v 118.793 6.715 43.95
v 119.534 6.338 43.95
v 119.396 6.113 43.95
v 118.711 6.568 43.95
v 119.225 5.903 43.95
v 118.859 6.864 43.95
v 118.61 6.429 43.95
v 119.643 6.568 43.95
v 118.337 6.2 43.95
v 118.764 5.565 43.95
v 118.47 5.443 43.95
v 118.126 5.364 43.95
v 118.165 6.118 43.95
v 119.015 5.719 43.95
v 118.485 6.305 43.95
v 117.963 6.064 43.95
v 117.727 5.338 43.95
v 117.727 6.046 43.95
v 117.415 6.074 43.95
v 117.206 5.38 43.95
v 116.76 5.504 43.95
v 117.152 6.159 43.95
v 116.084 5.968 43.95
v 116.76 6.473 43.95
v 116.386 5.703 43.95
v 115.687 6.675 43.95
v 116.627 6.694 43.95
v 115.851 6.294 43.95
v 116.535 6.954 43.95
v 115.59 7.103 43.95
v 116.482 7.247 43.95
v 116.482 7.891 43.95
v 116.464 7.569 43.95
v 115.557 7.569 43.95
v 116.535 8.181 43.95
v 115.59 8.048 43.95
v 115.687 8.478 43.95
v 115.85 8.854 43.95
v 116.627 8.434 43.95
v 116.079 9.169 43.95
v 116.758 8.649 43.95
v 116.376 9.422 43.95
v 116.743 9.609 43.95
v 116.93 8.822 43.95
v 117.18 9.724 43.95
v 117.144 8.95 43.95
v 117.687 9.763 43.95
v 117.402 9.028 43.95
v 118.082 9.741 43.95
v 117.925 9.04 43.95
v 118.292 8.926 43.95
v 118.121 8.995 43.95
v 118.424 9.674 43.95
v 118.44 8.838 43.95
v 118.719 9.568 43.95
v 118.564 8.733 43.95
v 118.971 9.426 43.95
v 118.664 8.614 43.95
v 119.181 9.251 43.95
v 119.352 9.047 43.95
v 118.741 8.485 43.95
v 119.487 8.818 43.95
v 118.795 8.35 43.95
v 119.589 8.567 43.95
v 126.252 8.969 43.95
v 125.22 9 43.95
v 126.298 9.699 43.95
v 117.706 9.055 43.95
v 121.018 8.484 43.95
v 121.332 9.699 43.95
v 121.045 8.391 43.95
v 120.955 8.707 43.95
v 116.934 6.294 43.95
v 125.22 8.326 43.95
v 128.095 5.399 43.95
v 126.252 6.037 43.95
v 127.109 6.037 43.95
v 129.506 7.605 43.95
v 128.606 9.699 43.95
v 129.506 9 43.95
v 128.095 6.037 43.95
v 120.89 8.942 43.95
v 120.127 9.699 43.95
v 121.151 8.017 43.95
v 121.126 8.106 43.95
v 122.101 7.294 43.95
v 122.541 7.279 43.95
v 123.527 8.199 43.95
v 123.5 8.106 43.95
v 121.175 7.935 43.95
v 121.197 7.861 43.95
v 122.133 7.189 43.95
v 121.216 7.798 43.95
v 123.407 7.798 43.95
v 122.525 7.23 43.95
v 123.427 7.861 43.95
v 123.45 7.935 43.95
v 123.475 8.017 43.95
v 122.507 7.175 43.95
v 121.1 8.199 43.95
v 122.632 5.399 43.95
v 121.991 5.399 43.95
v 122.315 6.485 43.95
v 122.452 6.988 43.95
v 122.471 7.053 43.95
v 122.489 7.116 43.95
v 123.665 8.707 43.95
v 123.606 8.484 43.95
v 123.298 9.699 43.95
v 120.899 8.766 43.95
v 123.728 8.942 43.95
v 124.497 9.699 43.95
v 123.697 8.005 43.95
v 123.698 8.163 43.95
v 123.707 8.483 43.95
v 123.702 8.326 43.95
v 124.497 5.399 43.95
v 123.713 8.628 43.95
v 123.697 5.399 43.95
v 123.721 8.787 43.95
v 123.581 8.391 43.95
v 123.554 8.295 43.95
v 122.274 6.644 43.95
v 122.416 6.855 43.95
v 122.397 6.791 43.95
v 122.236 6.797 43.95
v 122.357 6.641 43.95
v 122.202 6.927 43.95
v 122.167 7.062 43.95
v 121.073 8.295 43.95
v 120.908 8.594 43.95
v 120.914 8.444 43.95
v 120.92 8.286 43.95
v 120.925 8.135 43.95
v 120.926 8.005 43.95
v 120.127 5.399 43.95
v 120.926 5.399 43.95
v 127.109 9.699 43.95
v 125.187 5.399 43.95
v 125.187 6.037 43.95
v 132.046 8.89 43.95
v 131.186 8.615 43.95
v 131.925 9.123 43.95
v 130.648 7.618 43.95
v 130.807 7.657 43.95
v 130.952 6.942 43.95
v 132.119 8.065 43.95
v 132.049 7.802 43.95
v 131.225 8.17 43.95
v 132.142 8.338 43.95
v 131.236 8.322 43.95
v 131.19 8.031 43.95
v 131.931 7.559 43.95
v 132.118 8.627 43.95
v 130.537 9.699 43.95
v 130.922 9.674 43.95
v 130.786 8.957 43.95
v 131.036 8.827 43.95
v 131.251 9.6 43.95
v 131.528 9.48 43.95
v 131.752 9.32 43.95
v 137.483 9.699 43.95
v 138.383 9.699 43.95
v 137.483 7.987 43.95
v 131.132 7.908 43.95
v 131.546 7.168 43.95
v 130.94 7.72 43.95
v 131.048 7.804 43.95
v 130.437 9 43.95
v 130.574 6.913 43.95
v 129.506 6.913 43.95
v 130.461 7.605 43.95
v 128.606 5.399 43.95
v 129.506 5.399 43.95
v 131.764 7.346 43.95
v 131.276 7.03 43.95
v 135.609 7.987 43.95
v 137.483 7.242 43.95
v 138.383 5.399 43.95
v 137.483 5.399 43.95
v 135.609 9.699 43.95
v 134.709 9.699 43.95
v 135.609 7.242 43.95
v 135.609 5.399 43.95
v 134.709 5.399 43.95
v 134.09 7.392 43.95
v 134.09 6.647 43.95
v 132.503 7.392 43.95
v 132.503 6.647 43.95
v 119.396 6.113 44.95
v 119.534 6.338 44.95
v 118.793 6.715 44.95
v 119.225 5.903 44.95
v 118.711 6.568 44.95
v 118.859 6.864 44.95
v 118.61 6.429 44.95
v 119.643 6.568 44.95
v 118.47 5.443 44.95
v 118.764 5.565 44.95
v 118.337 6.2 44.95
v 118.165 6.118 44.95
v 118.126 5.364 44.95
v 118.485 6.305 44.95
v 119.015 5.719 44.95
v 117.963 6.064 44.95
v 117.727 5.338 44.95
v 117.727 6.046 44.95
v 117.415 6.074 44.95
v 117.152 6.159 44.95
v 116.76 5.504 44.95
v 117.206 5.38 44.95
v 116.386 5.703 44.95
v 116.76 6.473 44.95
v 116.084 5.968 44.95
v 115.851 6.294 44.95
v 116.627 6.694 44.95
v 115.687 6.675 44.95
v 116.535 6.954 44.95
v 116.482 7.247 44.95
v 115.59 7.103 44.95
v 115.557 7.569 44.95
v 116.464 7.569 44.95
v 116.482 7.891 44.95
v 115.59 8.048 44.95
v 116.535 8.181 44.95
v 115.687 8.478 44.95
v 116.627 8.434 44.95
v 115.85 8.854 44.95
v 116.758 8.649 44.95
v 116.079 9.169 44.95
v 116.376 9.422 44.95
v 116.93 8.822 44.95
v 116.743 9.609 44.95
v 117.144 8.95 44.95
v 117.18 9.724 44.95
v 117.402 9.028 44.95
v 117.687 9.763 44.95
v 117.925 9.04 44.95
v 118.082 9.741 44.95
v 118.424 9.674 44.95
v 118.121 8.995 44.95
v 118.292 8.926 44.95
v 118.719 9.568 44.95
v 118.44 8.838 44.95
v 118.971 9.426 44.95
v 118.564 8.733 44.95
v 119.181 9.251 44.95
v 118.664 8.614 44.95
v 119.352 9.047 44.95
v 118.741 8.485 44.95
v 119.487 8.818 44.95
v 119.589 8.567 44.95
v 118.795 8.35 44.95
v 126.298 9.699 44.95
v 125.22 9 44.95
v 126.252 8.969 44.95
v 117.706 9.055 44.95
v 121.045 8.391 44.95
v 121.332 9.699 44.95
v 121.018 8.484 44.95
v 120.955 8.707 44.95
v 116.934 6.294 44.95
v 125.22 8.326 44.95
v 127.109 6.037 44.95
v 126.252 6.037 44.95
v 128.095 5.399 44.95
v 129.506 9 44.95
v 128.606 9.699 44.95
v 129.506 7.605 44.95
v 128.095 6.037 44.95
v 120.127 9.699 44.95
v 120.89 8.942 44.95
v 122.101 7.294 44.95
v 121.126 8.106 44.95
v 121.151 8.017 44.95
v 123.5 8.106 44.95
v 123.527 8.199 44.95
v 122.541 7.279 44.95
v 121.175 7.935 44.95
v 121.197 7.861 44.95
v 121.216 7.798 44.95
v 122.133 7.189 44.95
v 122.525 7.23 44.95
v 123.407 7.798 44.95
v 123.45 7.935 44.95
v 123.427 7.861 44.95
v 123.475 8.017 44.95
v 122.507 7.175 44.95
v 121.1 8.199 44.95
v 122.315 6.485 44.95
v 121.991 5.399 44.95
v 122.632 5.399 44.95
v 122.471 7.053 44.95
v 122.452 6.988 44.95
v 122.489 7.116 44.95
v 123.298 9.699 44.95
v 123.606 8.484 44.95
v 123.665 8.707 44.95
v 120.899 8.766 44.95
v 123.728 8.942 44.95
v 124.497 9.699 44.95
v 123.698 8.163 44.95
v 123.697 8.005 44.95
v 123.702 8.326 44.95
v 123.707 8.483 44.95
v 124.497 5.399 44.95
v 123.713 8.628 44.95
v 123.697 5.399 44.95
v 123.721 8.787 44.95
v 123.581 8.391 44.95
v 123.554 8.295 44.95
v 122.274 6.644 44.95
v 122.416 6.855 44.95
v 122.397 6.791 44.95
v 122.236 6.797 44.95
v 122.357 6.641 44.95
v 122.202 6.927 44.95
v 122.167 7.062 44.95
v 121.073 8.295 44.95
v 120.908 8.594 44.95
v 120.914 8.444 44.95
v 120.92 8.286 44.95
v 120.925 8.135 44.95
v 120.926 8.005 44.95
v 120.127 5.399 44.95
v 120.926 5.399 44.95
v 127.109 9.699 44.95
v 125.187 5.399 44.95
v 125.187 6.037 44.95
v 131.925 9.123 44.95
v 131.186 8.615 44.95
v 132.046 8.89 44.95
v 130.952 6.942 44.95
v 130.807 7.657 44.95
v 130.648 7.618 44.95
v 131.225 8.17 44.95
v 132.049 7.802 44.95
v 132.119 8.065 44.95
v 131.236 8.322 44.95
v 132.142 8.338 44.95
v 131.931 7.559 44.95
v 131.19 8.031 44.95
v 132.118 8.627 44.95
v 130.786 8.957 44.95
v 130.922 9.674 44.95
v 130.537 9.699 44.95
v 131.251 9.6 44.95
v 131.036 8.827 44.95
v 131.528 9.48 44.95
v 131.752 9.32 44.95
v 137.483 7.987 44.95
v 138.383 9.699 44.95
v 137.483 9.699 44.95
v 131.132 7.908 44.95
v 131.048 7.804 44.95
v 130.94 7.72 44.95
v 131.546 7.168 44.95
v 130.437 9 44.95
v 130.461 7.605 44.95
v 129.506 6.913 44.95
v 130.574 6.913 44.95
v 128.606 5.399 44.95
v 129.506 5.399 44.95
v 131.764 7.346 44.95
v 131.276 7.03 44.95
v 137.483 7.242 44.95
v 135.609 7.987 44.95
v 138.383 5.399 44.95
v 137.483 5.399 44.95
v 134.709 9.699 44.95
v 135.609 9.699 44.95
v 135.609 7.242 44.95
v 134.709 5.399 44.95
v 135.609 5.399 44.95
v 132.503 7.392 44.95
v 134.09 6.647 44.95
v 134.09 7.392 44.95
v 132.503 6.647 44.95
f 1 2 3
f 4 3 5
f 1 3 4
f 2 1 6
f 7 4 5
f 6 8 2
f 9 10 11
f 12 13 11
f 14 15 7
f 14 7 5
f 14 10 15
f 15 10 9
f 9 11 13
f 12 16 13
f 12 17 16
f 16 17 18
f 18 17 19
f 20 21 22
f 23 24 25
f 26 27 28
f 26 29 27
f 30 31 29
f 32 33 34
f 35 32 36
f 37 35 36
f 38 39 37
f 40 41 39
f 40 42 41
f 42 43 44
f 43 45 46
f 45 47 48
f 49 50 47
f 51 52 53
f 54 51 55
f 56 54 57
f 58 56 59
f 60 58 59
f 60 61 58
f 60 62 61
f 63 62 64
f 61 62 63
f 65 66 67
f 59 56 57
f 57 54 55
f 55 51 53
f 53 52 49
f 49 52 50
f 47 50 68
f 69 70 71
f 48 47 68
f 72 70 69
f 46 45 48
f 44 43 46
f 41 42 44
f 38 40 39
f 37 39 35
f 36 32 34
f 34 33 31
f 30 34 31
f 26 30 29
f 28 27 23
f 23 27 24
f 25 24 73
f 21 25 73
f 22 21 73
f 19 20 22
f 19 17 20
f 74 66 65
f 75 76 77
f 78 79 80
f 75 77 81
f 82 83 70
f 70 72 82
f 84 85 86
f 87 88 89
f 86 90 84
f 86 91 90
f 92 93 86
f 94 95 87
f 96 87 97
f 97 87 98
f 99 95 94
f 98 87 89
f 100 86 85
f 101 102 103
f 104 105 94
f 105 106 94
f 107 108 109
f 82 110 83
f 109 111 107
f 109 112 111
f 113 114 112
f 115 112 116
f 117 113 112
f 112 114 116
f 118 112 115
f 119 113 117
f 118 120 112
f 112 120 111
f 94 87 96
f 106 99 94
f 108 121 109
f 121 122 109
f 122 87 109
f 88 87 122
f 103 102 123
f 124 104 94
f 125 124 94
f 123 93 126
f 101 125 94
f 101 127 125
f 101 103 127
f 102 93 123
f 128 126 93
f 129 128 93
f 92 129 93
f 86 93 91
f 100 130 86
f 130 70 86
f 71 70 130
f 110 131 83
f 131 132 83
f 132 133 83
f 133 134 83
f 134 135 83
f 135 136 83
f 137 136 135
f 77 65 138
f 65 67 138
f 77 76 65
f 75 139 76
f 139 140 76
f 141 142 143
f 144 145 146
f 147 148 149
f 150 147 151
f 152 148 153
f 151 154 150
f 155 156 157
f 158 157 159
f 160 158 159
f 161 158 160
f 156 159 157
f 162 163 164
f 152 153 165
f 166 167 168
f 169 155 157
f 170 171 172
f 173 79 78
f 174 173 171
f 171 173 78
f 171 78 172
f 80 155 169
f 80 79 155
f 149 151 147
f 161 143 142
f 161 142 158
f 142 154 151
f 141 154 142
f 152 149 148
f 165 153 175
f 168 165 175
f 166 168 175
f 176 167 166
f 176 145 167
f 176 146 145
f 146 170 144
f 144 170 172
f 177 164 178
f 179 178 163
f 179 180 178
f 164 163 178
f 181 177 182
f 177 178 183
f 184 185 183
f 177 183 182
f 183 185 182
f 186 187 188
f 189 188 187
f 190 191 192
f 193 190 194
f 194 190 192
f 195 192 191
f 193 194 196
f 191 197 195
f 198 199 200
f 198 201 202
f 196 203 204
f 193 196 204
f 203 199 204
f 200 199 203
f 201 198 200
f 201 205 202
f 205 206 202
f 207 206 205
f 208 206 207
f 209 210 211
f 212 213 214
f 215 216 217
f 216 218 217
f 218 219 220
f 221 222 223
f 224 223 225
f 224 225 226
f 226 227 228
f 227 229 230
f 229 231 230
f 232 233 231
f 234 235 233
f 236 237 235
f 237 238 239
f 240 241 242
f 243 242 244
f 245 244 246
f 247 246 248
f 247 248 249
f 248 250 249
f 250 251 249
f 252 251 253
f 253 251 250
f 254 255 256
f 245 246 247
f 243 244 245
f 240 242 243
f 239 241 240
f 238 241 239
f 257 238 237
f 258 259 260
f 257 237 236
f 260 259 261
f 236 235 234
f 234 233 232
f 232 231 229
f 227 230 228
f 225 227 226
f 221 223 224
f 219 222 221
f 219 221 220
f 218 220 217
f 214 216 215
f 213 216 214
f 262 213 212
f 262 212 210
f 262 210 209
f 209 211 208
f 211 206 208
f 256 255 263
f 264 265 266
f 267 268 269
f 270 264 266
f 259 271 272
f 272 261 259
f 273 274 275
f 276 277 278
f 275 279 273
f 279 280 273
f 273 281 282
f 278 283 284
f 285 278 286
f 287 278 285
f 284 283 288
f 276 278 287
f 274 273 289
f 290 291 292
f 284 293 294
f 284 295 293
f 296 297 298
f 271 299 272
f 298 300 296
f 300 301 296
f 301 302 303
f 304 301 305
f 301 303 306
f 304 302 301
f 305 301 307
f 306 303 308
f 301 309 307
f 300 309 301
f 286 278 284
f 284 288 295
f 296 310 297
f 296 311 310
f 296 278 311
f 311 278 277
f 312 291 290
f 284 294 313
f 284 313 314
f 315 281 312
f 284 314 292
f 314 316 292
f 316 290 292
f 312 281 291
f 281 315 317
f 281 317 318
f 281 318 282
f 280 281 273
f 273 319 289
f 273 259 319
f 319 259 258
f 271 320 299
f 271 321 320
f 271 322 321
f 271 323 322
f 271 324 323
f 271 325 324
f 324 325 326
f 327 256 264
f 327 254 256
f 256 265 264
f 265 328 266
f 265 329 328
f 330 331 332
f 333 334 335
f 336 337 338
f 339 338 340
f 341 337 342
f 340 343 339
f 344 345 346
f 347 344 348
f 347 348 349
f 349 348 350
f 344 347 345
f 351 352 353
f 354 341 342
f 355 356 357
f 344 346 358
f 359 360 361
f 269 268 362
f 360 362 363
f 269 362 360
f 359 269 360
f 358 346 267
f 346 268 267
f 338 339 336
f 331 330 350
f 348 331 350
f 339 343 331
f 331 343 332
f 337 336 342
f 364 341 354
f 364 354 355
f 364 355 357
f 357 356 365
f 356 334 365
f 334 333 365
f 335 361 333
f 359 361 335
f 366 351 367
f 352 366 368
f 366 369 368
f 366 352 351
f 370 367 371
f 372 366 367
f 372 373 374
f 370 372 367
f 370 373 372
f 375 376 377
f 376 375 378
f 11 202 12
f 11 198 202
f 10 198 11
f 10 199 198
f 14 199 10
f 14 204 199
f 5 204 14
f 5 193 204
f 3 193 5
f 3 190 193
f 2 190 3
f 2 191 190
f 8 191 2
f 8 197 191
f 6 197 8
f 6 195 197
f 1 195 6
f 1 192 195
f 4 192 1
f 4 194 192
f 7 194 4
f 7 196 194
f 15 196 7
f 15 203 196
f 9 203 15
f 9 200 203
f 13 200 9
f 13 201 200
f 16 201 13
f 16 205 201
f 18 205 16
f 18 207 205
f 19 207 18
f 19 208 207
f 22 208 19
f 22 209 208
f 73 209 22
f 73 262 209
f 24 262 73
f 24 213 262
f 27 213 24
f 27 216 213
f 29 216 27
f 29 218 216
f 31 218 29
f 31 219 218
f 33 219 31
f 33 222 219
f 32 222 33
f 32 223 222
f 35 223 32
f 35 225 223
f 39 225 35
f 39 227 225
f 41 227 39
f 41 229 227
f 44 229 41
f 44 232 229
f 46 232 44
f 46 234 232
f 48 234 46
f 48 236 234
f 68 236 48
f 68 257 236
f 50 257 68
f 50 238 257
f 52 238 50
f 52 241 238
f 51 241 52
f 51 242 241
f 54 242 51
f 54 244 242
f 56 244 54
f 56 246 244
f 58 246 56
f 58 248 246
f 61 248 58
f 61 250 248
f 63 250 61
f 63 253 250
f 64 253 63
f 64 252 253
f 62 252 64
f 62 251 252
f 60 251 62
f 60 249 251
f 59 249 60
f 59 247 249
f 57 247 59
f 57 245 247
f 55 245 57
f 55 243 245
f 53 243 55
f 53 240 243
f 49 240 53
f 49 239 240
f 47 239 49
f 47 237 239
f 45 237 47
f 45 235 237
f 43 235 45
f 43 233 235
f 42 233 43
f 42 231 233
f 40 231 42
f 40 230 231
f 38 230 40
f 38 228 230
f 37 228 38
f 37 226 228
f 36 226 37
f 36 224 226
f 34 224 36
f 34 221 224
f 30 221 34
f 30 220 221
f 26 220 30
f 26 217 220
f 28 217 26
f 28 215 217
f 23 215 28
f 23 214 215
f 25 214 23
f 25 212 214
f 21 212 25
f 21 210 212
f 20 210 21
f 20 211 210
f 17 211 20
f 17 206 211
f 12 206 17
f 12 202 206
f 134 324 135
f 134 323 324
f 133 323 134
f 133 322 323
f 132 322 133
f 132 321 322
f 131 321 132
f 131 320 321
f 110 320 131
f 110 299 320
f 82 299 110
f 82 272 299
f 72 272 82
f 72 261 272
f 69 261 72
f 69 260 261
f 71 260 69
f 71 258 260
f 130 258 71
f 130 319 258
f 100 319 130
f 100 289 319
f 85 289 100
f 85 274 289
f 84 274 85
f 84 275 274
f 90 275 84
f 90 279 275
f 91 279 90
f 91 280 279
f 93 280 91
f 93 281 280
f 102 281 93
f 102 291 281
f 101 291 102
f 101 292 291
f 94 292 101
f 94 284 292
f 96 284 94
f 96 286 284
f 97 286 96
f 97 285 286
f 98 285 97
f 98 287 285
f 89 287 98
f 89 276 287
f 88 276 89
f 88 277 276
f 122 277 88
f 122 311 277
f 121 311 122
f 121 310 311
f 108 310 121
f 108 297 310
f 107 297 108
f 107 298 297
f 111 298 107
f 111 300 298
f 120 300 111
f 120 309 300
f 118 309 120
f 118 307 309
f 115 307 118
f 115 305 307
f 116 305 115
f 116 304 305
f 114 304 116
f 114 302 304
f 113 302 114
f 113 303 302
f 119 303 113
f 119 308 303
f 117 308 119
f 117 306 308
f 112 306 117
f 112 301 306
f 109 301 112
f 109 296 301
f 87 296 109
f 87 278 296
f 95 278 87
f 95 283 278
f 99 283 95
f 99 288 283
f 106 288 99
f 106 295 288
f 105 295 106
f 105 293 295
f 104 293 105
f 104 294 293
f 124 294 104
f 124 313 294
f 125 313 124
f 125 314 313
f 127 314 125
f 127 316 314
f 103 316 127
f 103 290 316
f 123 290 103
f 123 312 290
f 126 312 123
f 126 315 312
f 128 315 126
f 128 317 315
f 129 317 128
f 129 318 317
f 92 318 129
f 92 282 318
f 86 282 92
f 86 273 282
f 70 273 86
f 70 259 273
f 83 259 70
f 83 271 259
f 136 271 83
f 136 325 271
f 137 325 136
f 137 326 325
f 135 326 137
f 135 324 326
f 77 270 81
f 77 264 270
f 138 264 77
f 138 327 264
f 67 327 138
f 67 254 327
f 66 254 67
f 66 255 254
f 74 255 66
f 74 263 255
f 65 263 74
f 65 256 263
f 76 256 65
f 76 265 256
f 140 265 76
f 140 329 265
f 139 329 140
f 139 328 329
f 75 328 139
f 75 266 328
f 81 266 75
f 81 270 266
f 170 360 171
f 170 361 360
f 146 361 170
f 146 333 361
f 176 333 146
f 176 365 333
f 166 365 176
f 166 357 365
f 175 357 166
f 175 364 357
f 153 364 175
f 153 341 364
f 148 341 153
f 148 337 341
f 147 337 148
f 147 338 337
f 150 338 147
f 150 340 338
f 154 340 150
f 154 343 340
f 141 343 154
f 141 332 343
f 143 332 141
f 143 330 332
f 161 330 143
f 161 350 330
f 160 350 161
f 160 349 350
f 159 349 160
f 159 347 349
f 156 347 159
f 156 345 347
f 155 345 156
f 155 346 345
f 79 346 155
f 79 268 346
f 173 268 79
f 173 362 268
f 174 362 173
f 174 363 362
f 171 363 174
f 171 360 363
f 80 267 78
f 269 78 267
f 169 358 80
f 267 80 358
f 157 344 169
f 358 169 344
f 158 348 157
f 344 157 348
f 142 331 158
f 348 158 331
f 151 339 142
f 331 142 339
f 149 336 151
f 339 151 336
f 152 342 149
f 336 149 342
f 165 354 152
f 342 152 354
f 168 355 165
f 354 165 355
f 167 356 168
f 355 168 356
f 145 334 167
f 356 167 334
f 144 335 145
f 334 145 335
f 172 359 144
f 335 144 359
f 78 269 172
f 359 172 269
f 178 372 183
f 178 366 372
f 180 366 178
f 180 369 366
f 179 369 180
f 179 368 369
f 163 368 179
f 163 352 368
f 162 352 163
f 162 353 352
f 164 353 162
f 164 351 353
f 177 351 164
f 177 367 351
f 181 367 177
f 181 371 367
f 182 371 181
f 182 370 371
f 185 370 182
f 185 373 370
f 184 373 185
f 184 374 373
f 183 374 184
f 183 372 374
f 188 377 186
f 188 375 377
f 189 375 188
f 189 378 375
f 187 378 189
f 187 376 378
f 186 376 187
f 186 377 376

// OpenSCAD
// CM1P-H ID text, engraved 0.5 into the plate's top face (frame as cm1p_h_freecad.py).
translate([127, 7.5, 43.95]) linear_extrude(1) text("CM1P-H", size = 4.5, font = "Liberation Sans:style=Bold", halign = "center", valign = "center");
